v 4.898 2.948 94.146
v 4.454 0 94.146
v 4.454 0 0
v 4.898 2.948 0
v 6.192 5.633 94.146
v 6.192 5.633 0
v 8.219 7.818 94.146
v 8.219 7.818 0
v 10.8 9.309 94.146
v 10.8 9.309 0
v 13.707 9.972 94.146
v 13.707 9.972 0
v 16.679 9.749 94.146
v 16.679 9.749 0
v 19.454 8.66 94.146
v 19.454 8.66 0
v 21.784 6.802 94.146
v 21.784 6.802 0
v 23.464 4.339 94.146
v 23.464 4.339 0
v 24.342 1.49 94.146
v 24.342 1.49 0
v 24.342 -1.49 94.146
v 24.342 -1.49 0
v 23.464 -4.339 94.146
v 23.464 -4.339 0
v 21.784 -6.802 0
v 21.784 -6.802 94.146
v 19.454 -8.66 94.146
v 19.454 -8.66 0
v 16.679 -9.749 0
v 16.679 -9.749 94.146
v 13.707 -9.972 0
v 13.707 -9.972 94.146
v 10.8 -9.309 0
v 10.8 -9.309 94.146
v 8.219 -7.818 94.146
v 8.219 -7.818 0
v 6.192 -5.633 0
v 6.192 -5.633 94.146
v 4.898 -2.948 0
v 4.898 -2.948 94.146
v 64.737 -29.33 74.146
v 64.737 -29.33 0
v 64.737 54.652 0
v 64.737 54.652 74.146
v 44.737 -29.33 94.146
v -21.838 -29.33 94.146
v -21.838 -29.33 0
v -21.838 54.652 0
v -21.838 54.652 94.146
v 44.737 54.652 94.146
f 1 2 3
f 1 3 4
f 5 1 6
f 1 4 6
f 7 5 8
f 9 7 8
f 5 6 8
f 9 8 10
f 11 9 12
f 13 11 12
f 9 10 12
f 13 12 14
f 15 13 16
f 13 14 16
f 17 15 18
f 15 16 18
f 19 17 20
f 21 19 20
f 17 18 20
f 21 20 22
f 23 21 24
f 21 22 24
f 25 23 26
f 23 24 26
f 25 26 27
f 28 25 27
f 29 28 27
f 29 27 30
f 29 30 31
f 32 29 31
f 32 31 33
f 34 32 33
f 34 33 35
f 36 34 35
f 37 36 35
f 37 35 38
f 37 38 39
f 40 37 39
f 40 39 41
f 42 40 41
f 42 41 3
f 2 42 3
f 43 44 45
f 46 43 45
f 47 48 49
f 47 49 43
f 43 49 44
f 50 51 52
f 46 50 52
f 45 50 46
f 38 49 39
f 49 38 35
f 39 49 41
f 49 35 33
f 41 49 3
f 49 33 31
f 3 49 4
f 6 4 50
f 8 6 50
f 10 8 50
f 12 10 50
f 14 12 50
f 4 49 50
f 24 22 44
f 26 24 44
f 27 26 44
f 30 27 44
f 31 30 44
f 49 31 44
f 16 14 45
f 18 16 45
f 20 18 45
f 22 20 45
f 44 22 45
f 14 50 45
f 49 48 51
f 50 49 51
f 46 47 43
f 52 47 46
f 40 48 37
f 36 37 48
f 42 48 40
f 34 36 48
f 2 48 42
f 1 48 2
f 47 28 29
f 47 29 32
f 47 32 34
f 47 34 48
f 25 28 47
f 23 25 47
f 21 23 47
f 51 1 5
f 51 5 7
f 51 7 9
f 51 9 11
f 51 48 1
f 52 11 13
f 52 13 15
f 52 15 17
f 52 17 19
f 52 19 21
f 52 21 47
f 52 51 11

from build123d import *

# Parameters (mm, degrees)
F0_W     = 86.574215
F0_H     = 83.982148
F1_DEPTH = 94.14638
F2_SIZE  = 20
F4_D     = 20


with BuildPart() as f1:
    # F0 (on Top) → F1 (new body)
    with BuildSketch(Plane.XY):
        with Locations((21.449423, 12.660671)):
            Rectangle(F0_W, F0_H)
    extrude(amount=F1_DEPTH)

    # F2
    f2_edges = [f1.edges().sort_by_distance(p)[0] for p in [
        (64.73653, 12.660671, 94.14638),
    ]]
    chamfer(f2_edges, length=F2_SIZE)

    # F4 (through all)
    with Locations(Plane.XY.offset(94.14638)):
        with Locations((14.453897, 0)):
            Hole(F4_D / 2)


solid = f1.part
